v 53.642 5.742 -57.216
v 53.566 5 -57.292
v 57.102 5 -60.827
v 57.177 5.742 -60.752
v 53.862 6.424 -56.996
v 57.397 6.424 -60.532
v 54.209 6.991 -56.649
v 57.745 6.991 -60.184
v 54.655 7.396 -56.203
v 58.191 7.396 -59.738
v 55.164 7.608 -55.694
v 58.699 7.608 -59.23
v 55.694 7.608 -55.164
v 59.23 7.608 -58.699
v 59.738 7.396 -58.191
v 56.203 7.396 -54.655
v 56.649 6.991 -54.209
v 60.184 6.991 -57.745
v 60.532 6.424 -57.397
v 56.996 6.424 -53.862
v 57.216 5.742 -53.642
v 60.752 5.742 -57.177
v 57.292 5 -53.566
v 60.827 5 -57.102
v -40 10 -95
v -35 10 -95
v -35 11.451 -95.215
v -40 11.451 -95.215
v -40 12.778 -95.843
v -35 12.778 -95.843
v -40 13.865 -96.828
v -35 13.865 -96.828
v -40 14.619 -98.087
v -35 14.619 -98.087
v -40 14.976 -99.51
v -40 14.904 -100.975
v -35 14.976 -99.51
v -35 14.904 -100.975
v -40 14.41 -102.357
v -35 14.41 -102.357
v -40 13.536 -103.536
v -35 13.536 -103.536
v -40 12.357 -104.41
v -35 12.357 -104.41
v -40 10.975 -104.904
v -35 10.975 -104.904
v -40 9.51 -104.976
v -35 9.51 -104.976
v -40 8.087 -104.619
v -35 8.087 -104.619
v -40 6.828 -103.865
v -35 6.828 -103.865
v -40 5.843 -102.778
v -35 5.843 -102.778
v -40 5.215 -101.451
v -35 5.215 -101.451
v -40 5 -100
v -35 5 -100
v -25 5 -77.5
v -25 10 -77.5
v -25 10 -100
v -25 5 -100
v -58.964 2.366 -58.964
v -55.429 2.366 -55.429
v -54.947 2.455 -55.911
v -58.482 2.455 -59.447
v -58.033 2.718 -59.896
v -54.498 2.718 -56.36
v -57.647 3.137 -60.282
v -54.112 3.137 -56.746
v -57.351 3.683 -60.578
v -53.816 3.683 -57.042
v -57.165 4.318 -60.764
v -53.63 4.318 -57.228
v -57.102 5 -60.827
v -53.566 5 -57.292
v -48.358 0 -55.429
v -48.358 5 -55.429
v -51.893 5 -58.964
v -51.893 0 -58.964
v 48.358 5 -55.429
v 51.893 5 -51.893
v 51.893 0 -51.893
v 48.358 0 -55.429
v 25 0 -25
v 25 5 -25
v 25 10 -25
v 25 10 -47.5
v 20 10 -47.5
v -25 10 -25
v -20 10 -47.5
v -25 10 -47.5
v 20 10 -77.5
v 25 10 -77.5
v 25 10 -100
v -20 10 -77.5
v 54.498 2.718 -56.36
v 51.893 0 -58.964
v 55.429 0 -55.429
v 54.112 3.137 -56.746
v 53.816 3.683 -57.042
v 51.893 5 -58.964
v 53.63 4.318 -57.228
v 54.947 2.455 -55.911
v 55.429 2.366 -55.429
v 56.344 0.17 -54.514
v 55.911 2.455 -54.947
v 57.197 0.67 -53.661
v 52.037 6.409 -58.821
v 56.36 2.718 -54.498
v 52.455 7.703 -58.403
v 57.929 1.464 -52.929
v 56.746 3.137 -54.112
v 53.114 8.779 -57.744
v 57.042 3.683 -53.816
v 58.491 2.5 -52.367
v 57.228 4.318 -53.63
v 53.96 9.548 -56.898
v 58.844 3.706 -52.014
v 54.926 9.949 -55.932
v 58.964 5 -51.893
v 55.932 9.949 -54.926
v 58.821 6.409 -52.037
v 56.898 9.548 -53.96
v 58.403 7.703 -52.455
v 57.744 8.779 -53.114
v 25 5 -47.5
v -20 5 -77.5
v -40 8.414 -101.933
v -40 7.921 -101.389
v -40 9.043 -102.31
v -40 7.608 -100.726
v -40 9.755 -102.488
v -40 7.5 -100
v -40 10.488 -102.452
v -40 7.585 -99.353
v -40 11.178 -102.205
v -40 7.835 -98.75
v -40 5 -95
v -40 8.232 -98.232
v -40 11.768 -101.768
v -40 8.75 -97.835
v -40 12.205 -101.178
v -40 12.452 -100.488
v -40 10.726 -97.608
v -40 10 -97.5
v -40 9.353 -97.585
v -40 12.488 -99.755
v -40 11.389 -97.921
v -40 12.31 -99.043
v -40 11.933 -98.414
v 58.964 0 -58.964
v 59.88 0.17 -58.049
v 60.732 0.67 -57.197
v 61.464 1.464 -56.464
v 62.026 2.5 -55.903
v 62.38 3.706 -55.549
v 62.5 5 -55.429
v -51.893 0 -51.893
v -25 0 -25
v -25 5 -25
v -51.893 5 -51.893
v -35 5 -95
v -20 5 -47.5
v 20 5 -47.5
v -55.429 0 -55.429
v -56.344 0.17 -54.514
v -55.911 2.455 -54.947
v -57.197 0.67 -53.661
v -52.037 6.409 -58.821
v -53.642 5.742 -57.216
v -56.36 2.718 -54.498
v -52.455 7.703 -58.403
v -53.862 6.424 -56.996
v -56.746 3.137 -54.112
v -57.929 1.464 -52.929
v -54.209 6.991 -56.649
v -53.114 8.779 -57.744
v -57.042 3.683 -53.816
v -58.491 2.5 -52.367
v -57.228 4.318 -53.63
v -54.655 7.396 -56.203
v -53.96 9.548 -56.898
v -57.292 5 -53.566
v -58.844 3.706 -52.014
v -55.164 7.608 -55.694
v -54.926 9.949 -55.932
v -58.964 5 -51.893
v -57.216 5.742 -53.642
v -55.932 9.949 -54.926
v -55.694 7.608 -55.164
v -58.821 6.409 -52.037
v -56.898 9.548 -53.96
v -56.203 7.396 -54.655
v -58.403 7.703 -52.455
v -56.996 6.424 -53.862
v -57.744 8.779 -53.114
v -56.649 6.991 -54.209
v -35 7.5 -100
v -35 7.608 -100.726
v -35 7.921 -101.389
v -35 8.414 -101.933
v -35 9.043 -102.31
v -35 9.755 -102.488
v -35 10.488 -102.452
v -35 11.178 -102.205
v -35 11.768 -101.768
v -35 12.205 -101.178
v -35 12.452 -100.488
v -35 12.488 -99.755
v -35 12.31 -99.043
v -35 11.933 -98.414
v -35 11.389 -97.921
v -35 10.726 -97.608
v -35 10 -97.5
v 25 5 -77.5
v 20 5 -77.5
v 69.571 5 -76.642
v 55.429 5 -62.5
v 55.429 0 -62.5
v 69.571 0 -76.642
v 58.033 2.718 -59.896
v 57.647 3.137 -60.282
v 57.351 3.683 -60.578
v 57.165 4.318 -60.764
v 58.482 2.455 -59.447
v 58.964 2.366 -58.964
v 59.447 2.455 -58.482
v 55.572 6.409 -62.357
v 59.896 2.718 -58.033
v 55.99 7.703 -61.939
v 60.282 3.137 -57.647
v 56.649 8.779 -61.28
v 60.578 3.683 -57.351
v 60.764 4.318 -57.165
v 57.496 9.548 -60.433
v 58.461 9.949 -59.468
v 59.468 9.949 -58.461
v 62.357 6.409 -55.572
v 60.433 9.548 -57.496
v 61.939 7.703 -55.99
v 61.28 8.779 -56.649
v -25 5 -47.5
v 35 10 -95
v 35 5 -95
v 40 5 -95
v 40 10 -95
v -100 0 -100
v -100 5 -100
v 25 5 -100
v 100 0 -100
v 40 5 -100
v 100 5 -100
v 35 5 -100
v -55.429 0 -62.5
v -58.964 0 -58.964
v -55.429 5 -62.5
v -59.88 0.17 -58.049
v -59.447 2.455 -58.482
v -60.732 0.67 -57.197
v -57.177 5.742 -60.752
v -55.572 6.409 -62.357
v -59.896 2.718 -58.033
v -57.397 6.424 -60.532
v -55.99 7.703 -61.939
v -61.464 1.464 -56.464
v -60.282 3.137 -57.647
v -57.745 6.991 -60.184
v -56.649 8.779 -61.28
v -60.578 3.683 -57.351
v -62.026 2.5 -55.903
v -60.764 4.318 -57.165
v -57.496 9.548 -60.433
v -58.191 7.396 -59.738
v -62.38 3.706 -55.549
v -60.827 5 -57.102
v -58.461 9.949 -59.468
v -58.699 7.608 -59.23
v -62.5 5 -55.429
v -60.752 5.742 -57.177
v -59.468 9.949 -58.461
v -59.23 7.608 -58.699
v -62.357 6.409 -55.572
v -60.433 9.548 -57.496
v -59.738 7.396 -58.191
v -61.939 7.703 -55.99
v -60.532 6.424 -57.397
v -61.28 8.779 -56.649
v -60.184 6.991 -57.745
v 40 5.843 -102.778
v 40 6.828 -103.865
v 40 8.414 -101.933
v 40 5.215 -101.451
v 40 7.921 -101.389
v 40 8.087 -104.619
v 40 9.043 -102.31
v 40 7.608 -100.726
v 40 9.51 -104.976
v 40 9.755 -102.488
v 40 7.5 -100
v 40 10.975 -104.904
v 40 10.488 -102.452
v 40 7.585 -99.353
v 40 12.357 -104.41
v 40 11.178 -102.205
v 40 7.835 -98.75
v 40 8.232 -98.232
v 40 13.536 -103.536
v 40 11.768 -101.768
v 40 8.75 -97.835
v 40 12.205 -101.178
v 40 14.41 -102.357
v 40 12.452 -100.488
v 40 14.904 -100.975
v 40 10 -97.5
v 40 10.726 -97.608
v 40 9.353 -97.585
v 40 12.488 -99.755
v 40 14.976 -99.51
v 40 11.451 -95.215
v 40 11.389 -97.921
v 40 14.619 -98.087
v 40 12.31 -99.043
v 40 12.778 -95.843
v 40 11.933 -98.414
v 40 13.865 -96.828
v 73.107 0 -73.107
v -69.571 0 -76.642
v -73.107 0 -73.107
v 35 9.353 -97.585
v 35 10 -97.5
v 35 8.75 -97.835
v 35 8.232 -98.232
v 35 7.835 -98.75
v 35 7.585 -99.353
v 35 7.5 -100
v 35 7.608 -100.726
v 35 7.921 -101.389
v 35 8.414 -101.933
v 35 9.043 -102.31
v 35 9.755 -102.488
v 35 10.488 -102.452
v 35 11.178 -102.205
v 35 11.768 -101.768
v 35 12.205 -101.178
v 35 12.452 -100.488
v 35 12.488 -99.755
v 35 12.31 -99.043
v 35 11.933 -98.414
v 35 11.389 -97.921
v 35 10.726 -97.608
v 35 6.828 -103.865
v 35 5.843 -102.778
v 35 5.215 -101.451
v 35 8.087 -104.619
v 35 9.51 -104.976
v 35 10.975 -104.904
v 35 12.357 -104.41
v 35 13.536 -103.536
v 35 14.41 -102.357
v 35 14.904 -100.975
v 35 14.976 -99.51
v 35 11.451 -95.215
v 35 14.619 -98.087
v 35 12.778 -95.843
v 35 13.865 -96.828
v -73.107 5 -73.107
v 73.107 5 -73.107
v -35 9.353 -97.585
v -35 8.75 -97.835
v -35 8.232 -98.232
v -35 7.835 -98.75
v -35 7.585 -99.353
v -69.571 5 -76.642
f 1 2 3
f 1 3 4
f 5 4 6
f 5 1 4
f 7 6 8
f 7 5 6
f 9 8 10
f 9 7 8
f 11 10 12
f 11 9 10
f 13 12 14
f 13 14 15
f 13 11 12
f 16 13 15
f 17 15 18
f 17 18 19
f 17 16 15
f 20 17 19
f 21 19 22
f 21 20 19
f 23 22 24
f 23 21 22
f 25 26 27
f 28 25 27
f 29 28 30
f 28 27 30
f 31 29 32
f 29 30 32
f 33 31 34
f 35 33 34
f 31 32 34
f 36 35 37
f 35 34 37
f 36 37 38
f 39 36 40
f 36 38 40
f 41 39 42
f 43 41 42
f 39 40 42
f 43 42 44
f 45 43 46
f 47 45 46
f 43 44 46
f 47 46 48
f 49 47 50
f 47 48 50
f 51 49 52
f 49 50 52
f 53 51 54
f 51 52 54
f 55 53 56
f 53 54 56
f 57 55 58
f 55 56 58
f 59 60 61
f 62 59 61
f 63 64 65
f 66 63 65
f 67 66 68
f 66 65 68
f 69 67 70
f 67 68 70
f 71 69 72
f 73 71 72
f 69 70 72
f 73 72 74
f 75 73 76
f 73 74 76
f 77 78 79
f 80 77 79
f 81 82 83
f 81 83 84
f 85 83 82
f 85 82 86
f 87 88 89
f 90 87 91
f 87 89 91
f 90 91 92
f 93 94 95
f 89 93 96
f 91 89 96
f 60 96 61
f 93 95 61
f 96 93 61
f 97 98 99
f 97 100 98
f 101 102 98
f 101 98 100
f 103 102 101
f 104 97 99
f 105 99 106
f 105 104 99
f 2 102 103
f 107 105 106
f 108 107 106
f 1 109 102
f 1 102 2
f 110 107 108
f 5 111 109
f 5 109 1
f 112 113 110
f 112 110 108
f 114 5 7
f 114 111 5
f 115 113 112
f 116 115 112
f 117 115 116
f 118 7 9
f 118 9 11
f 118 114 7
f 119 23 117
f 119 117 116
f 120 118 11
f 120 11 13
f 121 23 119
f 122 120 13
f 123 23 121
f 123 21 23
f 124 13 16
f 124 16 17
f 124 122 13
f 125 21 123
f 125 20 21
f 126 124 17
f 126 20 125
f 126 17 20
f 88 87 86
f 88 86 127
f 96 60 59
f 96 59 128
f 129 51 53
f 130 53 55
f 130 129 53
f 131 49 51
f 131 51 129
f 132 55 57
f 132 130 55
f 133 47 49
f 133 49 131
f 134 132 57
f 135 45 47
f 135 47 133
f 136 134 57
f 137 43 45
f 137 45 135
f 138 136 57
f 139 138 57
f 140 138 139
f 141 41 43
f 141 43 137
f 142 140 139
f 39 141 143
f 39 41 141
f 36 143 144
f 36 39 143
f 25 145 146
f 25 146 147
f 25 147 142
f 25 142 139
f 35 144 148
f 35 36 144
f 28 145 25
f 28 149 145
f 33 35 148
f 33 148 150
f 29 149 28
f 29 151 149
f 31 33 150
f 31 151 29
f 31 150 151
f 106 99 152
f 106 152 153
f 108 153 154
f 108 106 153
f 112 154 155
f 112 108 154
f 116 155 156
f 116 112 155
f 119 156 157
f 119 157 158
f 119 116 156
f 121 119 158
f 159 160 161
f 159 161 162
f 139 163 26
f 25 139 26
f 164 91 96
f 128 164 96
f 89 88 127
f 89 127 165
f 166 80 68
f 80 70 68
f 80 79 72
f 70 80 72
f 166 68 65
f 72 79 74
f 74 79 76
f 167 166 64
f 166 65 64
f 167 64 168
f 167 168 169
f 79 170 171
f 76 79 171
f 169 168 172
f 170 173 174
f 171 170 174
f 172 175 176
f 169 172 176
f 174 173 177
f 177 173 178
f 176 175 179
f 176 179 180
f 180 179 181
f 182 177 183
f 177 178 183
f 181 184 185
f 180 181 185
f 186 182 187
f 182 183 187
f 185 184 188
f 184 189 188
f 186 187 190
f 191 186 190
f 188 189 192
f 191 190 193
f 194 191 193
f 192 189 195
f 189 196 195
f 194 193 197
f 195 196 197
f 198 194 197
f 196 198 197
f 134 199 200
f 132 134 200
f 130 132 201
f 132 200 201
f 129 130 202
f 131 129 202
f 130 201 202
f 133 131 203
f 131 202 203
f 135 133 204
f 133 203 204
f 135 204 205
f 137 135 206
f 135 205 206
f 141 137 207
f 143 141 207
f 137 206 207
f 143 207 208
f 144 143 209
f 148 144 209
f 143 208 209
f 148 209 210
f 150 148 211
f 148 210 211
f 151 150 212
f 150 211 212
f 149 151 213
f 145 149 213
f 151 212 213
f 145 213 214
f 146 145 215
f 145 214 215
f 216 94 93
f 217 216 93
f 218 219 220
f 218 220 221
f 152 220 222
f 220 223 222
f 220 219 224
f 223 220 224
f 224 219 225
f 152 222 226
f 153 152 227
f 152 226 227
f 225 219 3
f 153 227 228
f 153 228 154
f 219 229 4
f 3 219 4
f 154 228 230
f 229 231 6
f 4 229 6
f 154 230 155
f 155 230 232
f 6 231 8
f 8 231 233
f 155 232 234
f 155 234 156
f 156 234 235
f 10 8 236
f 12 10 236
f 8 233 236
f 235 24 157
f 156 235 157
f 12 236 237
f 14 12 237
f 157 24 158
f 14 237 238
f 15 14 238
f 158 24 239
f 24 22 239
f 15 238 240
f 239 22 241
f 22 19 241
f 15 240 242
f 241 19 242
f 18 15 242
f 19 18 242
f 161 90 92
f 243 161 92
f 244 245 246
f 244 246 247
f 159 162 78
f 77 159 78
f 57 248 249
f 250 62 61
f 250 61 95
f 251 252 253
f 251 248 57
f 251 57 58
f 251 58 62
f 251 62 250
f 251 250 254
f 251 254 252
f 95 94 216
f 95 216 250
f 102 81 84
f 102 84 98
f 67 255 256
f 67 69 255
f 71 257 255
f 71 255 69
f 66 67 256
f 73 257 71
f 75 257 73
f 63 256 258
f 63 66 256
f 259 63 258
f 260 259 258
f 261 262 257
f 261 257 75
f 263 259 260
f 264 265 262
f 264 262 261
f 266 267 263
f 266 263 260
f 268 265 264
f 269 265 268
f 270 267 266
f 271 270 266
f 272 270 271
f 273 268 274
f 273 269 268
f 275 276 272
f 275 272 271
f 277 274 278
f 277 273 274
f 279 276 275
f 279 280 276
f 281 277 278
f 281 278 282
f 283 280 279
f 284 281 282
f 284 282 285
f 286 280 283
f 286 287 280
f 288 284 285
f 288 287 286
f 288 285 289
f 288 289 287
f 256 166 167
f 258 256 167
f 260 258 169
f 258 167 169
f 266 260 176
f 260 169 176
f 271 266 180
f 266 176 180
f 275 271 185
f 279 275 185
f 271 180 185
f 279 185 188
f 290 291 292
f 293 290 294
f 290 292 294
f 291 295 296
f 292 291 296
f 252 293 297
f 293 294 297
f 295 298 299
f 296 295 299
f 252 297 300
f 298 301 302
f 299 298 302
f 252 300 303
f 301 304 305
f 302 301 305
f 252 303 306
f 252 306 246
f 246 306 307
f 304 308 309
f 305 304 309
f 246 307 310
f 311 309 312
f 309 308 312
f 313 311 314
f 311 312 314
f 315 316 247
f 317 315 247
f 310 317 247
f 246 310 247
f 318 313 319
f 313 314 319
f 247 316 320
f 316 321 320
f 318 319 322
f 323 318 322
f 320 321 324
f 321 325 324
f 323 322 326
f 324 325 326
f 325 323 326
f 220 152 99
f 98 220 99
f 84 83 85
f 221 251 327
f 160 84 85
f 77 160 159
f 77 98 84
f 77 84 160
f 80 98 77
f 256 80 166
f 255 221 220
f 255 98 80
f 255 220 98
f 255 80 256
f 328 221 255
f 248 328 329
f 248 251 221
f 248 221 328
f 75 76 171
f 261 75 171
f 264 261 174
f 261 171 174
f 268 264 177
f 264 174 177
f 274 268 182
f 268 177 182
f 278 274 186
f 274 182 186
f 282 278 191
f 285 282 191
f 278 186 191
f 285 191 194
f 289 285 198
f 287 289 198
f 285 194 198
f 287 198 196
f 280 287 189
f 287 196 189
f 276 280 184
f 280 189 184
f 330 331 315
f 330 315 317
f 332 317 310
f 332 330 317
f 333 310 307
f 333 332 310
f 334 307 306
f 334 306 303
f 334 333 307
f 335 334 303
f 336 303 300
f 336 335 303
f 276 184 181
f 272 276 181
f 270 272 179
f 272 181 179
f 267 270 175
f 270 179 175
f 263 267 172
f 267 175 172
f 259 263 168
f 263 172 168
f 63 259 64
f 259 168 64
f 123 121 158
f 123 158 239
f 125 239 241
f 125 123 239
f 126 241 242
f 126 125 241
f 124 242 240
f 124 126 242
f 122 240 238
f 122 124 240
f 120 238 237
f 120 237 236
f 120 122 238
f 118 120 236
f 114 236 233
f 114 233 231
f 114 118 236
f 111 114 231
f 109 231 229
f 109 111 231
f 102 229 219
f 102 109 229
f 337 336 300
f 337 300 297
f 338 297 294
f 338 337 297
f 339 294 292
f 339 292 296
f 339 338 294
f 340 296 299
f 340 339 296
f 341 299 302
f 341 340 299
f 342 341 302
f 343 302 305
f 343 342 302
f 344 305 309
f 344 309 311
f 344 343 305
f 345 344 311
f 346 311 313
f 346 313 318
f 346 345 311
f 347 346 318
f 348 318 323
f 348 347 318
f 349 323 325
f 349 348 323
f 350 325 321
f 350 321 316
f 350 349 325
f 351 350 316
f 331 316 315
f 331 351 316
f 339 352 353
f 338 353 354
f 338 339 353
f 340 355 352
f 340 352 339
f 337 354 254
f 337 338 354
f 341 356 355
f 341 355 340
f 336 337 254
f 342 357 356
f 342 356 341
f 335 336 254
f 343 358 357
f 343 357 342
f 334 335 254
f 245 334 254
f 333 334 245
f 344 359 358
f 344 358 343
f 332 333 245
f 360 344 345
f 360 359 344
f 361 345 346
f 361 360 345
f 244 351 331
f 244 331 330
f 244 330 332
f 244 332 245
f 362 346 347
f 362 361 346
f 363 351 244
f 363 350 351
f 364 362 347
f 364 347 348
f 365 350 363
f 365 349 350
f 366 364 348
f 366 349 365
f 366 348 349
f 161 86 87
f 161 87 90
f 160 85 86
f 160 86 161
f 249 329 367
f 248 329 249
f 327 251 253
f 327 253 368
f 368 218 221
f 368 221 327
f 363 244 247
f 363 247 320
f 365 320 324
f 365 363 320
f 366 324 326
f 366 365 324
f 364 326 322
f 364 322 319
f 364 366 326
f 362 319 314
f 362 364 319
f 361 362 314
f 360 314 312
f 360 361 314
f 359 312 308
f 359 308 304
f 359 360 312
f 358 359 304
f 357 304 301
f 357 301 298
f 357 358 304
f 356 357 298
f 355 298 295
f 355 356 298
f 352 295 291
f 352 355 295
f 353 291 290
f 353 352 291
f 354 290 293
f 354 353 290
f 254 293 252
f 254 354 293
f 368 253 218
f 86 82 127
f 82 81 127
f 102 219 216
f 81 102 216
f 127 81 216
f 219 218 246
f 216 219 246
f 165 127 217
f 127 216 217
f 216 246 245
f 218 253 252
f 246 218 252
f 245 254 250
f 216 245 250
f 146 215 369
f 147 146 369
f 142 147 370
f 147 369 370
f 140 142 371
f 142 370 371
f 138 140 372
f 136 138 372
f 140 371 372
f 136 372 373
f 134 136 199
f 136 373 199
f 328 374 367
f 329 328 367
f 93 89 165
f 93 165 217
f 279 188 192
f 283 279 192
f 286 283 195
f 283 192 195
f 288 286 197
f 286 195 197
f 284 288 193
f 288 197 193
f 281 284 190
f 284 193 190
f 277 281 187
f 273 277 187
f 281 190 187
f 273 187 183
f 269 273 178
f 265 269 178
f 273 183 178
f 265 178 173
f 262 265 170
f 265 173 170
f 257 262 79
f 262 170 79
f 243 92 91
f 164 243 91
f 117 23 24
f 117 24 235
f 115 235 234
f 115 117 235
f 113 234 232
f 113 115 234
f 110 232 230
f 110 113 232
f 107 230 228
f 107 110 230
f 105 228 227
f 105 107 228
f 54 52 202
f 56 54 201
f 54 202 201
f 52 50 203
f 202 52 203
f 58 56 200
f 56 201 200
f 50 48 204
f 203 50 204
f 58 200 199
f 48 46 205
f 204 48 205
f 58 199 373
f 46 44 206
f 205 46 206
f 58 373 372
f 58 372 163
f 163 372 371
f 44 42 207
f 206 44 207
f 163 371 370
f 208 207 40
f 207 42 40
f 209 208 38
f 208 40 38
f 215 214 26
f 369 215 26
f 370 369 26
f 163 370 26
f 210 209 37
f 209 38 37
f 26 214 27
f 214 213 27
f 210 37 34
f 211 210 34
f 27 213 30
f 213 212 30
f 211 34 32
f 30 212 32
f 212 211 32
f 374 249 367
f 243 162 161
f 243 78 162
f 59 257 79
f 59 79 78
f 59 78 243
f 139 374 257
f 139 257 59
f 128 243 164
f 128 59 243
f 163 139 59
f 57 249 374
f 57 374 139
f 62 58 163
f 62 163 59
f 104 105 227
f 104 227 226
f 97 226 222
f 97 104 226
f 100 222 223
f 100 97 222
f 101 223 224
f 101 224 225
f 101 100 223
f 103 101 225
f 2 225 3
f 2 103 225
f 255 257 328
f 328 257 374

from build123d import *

# Parameters (mm, degrees)
BOSS_EXTRUDE1_DEPTH = 10
CUT_EXTRUDE1_DEPTH  = 5
CUT_EXTRUDE2_REACH  = 143.774
BOSS_EXTRUDE2_START = 5
SKETCH3_R           = 2.634477445
BOSS_EXTRUDE2_DEPTH = 5
BOSS_EXTRUDE3_START = 10
SKETCH4_R           = 2.5
BOSS_EXTRUDE3_DEPTH = 5


with BuildPart() as part:
    # Sketch1 → Boss-Extrude1 (new body)
    with BuildSketch(Plane(origin=(0, 0, 0), x_dir=(1, 0, 0), z_dir=(0, 1, 0))):
        Polygon((-25, 25), (-100, 100), (100, 100), (25, 25), align=None)
    extrude(amount=BOSS_EXTRUDE1_DEPTH)

    # Sketch2 → Cut-Extrude1 (cut)
    with BuildSketch(Plane(origin=(0, 10, 0), x_dir=(1, 0, 0), z_dir=(0, 1, 0))):
        Polygon((-25, 25), (-25, 47.5), (-20, 47.5), (-20, 77.5), (-25, 77.5), (-25, 100), (-100, 100), (-73.106601718, 73.106601718), (-69.571067812, 76.642135624), (-48.357864376, 55.428932188), (-51.893398282, 51.893398282), align=None)
    cut_extrude1 = extrude(amount=-CUT_EXTRUDE1_DEPTH, mode=Mode.SUBTRACT)

    # Sketch2<4> → Cut-Extrude2 (cut, up to next)
    with BuildSketch(Plane(origin=(0, 10, 0), x_dir=(1, 0, 0), z_dir=(0, 1, 0)), mode=Mode.PRIVATE) as cut_extrude2_sk1:
        Polygon((-73.106601718, 73.106601718), (-51.893398282, 51.893398282), (-48.357864376, 55.428932188), (-69.571067812, 76.642135624), align=None)
    cut_extrude2_tool1 = extrude(cut_extrude2_sk1.sketch, amount=-CUT_EXTRUDE2_REACH, mode=Mode.PRIVATE) & part.part
    cut_extrude2 = cut_extrude2_tool1.solids().sort_by_distance((-60.732233, 10, -64.267767))[0]
    add(cut_extrude2, mode=Mode.SUBTRACT)

    # Sketch3 → Boss-Extrude2 (add)
    with BuildSketch(Plane(origin=(-51.893398282, 0, -51.893398282), x_dir=(-0.7071067811865461, 0, 0.7071067811865489), z_dir=(-0.7071067811865489, 0, -0.7071067811865461)).offset(BOSS_EXTRUDE2_START)):
        with BuildLine():
            ThreePointArc((0, 0), (3.535533906, 8.535533906), (-5, 5))
            Line((-5, 5), (-5, 0))
            Line((-5, 0), (0, 0))
        make_face()
        with Locations((0, 5)):
            Circle(SKETCH3_R, mode=Mode.SUBTRACT)
    boss_extrude2 = extrude(amount=BOSS_EXTRUDE2_DEPTH)

    # Sketch4 → Boss-Extrude3 (add)
    with BuildSketch(Plane.ZY.offset(25).offset(BOSS_EXTRUDE3_START)):
        with BuildLine():
            ThreePointArc((-95, 10), (-103.535533906, 13.535533906), (-100, 5))
            Line((-100, 5), (-95, 5))
            Line((-95, 5), (-95, 10))
        make_face()
        with Locations((-100, 10)):
            Circle(SKETCH4_R, mode=Mode.SUBTRACT)
    boss_extrude3 = extrude(amount=BOSS_EXTRUDE3_DEPTH)

    # Mirror1: Cut-Extrude1, Cut-Extrude2, Boss-Extrude2, Boss-Extrude3 across plane
    add(cut_extrude1.mirror(Plane(origin=(0, 0, 0), x_dir=(0, 0, 1), z_dir=(1, 0, 0))), mode=Mode.SUBTRACT)
    add(cut_extrude2.mirror(Plane(origin=(0, 0, 0), x_dir=(0, 0, 1), z_dir=(1, 0, 0))), mode=Mode.SUBTRACT)
    add(boss_extrude2.mirror(Plane(origin=(0, 0, 0), x_dir=(0, 0, 1), z_dir=(1, 0, 0))))
    add(boss_extrude3.mirror(Plane(origin=(0, 0, 0), x_dir=(0, 0, 1), z_dir=(1, 0, 0))))


solid = part.part
